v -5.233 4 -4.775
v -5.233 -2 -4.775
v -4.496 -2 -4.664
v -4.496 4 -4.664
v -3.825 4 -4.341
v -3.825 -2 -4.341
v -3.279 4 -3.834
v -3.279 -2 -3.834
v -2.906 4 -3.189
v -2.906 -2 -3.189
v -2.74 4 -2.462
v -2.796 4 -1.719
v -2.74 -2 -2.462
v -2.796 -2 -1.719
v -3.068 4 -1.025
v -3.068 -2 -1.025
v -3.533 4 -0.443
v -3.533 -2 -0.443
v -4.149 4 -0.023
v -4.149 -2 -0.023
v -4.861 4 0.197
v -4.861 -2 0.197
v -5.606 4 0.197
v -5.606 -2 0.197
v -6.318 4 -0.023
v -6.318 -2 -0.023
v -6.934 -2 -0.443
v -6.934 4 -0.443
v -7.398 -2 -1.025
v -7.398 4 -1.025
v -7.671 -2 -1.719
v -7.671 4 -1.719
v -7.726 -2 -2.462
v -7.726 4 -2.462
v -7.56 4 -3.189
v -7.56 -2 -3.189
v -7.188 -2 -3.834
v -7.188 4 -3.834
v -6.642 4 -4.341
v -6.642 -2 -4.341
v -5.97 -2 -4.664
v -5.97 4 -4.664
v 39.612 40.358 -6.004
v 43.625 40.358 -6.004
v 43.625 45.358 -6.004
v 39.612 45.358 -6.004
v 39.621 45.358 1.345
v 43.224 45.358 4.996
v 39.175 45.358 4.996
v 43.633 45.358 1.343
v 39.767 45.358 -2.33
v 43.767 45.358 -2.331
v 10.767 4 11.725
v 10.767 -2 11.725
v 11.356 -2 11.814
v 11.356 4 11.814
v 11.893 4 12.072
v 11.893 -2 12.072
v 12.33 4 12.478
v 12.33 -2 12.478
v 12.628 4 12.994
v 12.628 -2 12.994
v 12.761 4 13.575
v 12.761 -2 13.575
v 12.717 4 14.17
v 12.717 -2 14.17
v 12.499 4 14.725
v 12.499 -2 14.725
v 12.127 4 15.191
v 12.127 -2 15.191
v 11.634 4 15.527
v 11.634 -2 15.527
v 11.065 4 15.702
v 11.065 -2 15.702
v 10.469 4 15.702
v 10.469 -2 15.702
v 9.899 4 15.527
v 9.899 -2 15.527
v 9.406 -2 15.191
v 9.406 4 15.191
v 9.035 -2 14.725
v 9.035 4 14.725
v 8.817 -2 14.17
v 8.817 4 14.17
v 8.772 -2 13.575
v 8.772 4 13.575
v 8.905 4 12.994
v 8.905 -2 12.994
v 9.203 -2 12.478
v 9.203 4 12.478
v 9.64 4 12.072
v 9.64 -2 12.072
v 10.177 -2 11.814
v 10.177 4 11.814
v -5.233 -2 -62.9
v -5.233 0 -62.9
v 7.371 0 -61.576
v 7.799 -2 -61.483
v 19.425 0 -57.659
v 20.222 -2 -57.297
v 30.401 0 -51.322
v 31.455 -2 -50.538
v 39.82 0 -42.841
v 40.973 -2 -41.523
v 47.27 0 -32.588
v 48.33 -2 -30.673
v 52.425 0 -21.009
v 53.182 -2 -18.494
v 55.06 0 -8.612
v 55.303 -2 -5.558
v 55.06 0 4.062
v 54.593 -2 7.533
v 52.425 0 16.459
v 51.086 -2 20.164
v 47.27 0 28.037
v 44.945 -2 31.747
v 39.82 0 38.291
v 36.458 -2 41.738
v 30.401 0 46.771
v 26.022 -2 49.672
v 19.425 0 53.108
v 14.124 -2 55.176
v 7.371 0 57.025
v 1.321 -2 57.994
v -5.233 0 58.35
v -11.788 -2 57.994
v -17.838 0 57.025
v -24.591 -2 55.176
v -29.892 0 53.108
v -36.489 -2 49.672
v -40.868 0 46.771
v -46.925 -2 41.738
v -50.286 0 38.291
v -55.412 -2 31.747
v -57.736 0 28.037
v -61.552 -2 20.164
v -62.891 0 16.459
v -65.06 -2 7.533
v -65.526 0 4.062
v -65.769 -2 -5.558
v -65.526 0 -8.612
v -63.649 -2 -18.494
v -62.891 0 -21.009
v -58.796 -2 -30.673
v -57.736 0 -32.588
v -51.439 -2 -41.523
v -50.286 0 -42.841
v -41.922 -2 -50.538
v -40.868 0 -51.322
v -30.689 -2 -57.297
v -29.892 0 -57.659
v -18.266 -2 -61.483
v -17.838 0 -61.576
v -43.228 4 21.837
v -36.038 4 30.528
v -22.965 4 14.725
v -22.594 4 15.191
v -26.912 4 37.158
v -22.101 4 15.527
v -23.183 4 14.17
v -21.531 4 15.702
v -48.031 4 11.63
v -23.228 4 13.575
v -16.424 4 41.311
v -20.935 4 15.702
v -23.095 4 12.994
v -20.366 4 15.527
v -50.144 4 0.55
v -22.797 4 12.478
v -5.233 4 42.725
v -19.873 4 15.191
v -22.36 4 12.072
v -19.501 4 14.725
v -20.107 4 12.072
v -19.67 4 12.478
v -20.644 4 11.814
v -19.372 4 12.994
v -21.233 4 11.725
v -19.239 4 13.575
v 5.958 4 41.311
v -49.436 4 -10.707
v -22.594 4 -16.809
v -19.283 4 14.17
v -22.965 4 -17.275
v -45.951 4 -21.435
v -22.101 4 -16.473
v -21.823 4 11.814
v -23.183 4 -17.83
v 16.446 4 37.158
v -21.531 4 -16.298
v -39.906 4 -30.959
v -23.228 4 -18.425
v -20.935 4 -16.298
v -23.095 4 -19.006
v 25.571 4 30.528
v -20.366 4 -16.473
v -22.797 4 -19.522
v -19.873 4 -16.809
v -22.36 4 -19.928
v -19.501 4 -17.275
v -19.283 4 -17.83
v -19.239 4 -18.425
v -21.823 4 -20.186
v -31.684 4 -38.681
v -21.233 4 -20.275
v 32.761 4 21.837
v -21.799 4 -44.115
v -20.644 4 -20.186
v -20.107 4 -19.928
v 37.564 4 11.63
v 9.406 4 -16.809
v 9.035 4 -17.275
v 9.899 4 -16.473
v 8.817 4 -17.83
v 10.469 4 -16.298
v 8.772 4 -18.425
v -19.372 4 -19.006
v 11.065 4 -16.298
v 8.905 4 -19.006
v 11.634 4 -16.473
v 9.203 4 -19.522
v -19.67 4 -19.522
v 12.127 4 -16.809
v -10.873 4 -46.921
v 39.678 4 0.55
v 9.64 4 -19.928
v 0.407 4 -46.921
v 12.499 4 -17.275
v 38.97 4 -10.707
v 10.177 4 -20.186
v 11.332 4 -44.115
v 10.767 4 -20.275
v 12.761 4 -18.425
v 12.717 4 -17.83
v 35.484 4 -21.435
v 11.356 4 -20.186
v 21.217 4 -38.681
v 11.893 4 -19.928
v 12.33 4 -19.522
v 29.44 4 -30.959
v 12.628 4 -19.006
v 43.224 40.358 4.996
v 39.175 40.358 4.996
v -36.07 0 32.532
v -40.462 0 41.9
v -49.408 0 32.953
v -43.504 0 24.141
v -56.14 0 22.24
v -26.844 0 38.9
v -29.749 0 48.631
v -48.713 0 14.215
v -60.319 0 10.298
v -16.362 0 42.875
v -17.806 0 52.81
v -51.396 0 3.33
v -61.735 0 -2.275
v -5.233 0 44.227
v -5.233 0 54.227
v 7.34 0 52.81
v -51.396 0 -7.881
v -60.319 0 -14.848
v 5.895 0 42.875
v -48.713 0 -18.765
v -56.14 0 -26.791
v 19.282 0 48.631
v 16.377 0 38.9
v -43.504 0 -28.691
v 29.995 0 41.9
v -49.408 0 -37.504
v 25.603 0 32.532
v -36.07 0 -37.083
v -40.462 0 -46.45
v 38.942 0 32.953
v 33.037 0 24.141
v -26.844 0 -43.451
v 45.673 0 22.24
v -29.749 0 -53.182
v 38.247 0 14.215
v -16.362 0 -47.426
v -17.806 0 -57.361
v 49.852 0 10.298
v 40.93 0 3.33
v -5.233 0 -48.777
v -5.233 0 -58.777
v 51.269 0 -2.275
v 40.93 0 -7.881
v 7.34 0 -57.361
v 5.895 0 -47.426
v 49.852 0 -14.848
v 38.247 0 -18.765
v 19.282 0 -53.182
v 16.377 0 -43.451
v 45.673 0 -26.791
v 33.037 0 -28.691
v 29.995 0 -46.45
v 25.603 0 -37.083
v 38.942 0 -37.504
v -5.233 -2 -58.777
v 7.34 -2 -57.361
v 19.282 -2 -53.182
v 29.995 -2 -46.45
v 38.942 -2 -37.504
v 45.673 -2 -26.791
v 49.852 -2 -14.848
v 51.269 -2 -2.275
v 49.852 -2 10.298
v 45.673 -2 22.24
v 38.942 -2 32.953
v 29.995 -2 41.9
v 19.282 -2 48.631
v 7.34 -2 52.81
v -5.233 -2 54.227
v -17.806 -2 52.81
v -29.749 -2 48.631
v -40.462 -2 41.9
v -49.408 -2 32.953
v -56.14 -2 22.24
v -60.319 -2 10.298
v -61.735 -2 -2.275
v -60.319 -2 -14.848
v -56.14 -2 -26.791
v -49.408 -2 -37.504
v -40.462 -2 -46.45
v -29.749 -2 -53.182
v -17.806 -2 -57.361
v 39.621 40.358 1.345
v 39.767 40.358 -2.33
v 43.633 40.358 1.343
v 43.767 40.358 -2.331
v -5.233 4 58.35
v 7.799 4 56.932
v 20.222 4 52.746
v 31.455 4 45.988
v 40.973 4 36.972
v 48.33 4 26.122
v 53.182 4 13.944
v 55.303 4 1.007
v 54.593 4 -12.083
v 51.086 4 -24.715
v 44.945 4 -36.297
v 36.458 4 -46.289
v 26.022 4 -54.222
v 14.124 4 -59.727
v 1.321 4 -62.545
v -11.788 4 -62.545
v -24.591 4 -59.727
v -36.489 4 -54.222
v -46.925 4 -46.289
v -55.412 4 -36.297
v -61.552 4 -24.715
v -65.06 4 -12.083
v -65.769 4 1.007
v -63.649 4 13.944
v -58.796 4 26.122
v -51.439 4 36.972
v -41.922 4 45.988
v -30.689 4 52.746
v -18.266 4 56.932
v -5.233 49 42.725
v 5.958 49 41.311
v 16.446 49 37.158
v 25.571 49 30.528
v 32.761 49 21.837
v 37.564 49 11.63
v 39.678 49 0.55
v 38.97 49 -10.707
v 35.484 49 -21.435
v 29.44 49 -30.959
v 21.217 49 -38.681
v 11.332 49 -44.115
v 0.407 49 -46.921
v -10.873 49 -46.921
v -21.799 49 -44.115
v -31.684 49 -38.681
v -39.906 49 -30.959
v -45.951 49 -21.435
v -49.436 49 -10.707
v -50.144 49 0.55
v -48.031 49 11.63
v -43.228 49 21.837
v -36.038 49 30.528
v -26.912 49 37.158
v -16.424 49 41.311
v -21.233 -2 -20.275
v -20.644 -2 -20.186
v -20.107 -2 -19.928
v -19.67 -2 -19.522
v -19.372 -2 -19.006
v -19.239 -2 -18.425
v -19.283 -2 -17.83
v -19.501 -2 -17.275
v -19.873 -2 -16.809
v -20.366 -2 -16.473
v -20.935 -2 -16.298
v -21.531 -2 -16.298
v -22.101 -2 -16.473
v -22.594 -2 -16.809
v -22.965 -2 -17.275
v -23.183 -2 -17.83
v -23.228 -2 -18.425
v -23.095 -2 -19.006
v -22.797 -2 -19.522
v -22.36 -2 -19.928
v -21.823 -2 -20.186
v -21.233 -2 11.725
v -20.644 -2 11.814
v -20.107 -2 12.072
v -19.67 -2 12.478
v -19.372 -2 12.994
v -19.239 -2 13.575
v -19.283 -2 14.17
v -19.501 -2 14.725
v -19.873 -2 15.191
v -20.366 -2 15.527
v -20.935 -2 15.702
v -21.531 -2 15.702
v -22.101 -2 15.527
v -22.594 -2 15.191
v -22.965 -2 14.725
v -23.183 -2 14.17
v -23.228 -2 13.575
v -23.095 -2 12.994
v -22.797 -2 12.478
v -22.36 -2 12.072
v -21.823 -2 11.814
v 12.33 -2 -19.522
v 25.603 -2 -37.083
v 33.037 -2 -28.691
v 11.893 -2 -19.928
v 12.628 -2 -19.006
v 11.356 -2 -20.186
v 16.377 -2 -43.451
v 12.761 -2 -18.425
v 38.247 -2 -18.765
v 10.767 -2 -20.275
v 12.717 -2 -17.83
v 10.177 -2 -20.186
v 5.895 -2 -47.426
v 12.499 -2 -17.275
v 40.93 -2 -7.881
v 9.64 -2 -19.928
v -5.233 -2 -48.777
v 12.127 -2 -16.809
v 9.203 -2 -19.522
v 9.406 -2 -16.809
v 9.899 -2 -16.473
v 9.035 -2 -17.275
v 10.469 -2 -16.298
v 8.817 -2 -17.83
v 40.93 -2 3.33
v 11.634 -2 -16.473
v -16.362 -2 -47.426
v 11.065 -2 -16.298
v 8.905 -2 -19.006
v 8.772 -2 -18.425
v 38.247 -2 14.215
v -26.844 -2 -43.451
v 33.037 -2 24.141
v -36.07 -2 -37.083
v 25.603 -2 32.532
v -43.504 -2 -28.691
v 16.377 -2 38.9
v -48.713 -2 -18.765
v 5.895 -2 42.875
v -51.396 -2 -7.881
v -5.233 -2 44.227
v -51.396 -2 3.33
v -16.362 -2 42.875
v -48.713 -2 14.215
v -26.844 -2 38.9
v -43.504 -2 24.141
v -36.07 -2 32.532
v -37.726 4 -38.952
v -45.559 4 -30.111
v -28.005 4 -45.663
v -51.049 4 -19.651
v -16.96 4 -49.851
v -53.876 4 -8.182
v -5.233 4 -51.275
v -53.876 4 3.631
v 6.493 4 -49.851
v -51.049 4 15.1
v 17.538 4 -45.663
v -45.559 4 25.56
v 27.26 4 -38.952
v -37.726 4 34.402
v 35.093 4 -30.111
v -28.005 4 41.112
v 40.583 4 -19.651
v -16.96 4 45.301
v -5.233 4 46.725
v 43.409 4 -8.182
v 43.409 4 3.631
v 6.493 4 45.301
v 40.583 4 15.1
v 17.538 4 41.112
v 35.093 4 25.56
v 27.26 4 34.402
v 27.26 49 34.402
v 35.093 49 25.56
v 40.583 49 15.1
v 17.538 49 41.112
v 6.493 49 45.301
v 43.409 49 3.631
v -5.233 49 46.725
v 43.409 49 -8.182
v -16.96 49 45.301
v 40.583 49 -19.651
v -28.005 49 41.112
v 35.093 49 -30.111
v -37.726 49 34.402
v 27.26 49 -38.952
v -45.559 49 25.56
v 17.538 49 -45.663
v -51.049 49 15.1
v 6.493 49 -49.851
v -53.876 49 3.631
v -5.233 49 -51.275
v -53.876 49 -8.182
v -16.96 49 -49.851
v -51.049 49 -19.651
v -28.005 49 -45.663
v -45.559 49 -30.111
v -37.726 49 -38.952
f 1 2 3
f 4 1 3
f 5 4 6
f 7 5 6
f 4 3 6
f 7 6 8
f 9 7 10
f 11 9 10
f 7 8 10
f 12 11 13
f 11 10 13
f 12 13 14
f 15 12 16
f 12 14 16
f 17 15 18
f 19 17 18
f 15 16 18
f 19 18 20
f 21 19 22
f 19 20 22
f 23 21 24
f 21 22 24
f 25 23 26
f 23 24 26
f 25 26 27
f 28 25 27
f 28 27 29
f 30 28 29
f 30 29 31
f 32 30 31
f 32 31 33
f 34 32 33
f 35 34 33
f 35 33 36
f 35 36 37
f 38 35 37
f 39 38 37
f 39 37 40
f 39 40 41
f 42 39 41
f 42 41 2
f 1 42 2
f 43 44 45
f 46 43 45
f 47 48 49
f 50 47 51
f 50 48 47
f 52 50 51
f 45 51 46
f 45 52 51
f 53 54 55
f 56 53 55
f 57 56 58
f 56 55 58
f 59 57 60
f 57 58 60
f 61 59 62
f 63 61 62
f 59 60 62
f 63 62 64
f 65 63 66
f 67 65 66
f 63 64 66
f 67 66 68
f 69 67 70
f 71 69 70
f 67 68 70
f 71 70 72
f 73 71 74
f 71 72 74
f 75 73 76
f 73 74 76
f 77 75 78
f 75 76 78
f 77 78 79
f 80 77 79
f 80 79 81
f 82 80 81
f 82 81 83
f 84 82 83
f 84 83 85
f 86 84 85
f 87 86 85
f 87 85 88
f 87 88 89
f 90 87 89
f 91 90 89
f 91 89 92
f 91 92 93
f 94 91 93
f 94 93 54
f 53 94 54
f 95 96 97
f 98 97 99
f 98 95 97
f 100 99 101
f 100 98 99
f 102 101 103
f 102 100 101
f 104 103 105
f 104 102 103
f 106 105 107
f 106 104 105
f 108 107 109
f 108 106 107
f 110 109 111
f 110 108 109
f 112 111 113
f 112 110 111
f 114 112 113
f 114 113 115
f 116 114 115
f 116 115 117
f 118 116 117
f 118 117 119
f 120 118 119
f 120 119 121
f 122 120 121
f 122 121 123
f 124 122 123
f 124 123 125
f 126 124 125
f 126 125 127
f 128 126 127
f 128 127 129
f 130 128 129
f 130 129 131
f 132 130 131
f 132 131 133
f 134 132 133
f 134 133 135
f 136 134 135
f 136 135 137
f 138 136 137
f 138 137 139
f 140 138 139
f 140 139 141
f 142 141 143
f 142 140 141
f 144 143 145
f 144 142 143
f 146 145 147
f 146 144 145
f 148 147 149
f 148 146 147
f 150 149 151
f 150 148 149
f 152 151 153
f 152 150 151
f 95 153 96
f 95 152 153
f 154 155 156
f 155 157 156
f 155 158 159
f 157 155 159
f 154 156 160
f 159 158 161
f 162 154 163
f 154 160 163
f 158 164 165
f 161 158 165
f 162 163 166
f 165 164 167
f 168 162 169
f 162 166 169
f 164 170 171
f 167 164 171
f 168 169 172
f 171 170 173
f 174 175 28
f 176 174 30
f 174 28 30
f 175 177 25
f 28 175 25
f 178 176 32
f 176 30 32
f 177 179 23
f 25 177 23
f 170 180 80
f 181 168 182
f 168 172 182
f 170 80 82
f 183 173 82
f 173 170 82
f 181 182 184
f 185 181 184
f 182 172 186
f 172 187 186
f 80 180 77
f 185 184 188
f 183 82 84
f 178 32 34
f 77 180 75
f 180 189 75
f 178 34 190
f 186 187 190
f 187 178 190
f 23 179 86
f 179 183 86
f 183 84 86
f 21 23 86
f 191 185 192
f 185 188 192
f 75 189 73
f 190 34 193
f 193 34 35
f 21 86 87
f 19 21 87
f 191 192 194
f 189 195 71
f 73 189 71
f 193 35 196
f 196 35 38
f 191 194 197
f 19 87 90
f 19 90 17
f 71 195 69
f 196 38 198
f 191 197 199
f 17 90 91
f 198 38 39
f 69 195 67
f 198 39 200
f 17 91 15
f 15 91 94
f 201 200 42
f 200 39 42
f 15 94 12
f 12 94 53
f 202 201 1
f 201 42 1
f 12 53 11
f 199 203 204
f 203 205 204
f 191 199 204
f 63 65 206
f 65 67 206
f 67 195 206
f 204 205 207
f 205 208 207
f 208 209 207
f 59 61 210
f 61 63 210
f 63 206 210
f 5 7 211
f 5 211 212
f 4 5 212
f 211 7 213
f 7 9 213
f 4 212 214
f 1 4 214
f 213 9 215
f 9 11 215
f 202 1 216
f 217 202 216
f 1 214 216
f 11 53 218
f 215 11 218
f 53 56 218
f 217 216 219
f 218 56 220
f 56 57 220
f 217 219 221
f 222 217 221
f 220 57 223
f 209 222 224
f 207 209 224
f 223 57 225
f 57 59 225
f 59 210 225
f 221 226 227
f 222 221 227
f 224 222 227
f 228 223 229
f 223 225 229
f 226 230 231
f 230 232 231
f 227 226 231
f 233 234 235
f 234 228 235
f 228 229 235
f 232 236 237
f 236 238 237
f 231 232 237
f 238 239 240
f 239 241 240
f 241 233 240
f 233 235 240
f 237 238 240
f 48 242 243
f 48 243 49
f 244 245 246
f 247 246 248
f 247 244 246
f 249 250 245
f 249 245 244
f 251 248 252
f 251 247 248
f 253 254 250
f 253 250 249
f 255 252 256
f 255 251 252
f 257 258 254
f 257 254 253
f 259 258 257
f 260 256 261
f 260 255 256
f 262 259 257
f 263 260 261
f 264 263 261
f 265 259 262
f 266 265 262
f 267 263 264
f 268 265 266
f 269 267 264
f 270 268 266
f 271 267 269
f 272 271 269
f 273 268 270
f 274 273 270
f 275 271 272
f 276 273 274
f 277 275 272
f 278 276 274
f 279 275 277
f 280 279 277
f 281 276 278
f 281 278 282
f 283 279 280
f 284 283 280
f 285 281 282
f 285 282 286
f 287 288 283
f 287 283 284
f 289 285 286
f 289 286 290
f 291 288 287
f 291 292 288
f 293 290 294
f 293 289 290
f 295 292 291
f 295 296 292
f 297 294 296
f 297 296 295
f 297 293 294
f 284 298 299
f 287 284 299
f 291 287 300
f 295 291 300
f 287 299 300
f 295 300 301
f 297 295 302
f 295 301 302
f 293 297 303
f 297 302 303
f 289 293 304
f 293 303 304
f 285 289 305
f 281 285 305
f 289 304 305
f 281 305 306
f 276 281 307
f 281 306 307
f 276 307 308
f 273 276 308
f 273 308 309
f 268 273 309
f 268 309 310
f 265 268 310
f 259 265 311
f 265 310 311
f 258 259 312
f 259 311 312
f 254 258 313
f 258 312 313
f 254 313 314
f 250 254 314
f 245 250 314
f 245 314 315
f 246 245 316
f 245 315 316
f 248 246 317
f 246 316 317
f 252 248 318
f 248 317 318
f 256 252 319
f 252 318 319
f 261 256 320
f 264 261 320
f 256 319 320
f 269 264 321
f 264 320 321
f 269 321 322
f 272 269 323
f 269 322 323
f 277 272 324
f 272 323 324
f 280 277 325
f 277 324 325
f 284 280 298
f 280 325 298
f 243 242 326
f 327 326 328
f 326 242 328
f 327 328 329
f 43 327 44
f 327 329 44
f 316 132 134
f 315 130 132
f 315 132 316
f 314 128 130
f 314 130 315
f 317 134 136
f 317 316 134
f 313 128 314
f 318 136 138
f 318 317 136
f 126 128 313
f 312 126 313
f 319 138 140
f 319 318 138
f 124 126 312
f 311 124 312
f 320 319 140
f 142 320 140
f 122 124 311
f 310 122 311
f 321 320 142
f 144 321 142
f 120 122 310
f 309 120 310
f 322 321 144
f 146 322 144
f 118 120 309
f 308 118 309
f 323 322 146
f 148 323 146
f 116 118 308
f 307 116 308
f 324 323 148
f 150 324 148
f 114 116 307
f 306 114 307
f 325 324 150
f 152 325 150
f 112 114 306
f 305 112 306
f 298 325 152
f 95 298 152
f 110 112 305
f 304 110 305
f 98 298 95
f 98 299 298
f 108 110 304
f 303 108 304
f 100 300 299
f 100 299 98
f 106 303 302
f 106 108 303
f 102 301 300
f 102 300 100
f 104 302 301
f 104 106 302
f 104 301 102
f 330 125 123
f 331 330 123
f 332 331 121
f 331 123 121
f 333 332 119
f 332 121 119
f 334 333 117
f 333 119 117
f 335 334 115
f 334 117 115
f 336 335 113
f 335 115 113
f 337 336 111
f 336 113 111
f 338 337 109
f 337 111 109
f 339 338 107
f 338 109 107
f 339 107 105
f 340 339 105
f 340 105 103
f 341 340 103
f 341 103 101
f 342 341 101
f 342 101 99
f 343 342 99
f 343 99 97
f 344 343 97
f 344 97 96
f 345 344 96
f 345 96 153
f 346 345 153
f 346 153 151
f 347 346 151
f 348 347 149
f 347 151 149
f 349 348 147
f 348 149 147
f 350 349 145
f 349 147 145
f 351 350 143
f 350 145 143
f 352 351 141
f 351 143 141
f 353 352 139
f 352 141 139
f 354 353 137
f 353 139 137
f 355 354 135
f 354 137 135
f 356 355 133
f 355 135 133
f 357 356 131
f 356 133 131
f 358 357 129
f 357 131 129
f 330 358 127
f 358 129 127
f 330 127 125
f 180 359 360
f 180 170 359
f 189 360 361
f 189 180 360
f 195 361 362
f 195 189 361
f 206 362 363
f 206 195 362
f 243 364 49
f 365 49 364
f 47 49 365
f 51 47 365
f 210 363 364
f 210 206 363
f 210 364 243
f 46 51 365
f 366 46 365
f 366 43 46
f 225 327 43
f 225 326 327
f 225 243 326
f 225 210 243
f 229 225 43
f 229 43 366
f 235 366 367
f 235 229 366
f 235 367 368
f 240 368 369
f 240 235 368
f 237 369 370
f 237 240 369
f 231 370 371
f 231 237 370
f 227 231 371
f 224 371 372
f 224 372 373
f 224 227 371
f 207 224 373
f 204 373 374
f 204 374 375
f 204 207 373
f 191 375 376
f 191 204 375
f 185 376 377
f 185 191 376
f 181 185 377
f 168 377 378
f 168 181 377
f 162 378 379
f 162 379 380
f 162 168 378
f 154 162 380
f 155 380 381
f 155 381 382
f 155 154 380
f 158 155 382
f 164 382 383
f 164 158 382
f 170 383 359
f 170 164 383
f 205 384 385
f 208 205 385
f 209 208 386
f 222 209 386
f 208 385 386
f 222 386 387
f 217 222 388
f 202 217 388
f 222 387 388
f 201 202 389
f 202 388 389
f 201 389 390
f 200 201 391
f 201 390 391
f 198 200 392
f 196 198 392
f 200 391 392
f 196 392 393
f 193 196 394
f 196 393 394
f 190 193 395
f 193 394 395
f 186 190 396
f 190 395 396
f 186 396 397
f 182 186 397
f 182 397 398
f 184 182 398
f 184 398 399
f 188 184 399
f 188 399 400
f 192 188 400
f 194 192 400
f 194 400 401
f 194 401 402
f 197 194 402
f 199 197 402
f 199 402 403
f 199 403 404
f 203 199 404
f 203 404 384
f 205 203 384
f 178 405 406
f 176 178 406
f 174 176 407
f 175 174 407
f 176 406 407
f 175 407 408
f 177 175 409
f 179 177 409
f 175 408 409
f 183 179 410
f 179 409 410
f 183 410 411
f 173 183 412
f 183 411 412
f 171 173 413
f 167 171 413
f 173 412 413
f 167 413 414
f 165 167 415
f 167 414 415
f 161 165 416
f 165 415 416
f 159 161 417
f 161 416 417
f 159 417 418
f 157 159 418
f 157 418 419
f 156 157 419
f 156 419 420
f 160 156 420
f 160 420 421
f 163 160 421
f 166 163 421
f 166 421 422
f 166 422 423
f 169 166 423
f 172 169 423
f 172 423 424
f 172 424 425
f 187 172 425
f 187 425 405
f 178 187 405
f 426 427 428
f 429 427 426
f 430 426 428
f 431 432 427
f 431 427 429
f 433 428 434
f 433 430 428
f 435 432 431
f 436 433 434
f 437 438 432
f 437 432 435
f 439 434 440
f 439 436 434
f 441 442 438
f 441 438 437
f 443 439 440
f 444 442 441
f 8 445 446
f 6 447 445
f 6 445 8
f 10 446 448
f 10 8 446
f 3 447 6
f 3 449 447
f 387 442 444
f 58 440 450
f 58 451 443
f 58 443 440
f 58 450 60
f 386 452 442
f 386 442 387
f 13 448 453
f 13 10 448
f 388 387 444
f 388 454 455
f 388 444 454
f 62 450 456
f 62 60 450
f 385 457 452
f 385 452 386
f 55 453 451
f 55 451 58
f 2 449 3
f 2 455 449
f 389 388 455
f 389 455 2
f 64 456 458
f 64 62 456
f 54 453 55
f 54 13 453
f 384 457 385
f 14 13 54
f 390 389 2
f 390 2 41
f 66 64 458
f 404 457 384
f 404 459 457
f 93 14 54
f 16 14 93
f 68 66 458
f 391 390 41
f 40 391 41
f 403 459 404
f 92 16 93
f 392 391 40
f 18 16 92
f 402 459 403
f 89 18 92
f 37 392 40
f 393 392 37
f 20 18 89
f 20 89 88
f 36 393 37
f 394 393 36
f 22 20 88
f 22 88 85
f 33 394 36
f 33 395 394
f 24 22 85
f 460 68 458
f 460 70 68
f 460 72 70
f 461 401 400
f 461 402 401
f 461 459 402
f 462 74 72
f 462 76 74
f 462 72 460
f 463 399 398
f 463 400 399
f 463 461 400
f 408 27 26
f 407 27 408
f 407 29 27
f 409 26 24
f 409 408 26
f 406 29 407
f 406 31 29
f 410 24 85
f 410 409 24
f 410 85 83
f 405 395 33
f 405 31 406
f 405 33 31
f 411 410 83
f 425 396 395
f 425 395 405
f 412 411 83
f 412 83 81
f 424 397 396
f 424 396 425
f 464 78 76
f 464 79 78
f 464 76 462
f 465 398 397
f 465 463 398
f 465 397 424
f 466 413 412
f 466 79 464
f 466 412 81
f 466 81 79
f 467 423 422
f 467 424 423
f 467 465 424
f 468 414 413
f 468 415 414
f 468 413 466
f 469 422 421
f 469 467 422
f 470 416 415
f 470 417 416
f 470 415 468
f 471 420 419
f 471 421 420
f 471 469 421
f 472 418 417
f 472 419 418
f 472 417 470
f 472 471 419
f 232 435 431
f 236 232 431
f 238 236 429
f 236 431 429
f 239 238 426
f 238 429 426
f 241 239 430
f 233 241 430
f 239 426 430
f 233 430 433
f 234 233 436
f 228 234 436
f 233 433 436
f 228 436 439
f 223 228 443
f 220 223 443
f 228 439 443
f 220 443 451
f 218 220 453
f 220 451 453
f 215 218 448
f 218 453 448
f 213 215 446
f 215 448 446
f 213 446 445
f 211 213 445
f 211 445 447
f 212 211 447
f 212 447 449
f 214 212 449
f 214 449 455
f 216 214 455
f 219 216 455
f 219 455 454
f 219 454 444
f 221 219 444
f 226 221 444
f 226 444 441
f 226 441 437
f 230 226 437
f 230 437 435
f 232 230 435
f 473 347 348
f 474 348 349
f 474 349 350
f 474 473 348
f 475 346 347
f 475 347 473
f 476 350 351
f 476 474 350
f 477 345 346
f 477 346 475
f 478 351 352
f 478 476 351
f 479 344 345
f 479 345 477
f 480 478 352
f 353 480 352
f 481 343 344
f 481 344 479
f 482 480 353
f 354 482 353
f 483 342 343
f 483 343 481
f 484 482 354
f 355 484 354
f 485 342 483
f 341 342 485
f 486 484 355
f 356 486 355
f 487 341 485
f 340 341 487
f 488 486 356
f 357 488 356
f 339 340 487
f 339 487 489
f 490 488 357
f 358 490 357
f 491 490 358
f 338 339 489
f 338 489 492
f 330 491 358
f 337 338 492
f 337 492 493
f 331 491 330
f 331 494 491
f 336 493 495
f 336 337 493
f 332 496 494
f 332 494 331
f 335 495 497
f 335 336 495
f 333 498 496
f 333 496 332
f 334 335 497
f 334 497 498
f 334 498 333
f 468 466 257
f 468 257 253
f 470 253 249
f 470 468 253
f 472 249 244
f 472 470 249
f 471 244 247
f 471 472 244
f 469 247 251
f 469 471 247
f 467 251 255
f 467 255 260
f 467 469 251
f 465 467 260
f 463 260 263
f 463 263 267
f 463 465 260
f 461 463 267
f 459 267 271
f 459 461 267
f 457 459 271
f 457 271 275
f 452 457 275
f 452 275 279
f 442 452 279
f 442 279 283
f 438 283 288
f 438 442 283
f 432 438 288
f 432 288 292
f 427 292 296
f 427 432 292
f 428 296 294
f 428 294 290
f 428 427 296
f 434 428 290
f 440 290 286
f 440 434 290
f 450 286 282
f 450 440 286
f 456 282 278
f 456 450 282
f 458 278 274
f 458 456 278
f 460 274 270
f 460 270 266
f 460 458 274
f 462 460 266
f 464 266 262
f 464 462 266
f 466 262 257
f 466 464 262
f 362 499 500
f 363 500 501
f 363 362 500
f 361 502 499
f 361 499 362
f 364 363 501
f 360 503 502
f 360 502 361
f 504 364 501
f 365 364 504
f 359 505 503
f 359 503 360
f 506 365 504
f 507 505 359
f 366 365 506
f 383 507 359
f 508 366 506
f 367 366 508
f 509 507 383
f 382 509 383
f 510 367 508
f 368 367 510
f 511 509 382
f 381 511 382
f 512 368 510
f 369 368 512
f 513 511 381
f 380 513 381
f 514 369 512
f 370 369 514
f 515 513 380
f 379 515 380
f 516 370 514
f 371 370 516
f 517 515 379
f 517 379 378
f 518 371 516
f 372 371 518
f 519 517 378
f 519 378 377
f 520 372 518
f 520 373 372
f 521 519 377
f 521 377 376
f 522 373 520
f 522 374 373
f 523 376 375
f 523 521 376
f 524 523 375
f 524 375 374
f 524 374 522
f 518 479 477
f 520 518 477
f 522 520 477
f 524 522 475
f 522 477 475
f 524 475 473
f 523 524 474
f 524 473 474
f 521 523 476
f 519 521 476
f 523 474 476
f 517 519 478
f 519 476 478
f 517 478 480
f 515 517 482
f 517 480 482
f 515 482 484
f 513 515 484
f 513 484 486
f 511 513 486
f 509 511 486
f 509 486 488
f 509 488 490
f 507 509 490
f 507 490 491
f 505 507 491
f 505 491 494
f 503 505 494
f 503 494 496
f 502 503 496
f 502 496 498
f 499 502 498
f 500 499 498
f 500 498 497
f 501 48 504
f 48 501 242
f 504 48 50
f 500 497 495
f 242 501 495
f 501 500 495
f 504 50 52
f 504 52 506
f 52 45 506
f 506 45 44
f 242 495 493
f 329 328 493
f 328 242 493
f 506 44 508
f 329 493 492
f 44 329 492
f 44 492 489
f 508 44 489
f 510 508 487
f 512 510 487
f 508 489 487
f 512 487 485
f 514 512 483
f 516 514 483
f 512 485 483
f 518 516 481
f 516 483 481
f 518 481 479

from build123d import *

# Parameters (mm, degrees)
SKETCH1_R           = 60.625
SKETCH1_R_2         = 45
BOSS_EXTRUDE1_DEPTH = 4
SKETCH2_R           = 49
SKETCH2_R_2         = 45
BOSS_EXTRUDE2_DEPTH = 45
SKETCH3_R           = 45
BOSS_EXTRUDE3_DEPTH = 4
BOSS_EXTRUDE7_START = 2
SKETCH4_R           = 60.625
SKETCH4_R_2         = 56.502019499
SKETCH4_R_3         = 46.502019499
BOSS_EXTRUDE7_DEPTH = 2
SKETCH5_R           = 2.5
SKETCH5_R_2         = 2
CUT_EXTRUDE1_DEPTH  = 10
SKETCH6_W           = 11
SKETCH6_H           = 5
CUT_EXTRUDE2_DEPTH  = 10


with BuildPart() as part:
    # Sketch1 → Boss-Extrude1 (new body)
    with BuildSketch(Plane(origin=(0, 0, 0), x_dir=(1, 0, 0), z_dir=(0, 1, 0))):
        with Locations(Location((-5.233283161, 2.275340505, 0), (0, 0, 270))):
            Circle(SKETCH1_R)
        with Locations(Location((-5.233283161, 2.275340505, 0), (0, 0, 270))):
            Circle(SKETCH1_R_2, mode=Mode.SUBTRACT)
    extrude(amount=BOSS_EXTRUDE1_DEPTH)

    # Sketch2 → Boss-Extrude2 (add)
    with BuildSketch(Plane(origin=(0, 4, 0), x_dir=(1, 0, 0), z_dir=(0, 1, 0))):
        with Locations(Location((-5.233283161, 2.275340505, 0), (0, 0, 90))):
            Circle(SKETCH2_R)
        with Locations(Location((-5.233283161, 2.275340505, 0), (0, 0, 270))):
            Circle(SKETCH2_R_2, mode=Mode.SUBTRACT)
    extrude(amount=BOSS_EXTRUDE2_DEPTH)

    # Sketch3 → Boss-Extrude3 (add)
    with BuildSketch(Plane(origin=(0, 0, 0), x_dir=(-1, 0, 0), z_dir=(0, -1, 0))):
        with Locations(Location((5.233283161, 2.275340505, 0), (0, 0, 90))):
            Circle(SKETCH3_R)
    extrude(amount=-BOSS_EXTRUDE3_DEPTH)

    # Sketch4 → Boss-Extrude7 (add)
    # profile 1 of 2: a face of its own
    with BuildSketch(Plane.XZ.offset(BOSS_EXTRUDE7_START)):
        with Locations(Location((-5.233283161, -2.275340505, 0), (0, 0, 270))):
            Circle(SKETCH4_R)
        with Locations(Location((-5.233283161, -2.275340505, 0), (0, 0, 270))):
            Circle(SKETCH4_R_2, mode=Mode.SUBTRACT)
    # profile 2 of 2: a face of its own
    with BuildSketch(Plane.XZ.offset(BOSS_EXTRUDE7_START)):
        with Locations(Location((-5.233283161, -2.275340505, 0), (0, 0, 90))):
            Circle(SKETCH4_R_3)
    extrude(amount=-BOSS_EXTRUDE7_DEPTH)

    # Sketch5 → Cut-Extrude1 (cut)
    with BuildSketch(Plane(origin=(0, -2, 0), x_dir=(-1, 0, 0), z_dir=(0, -1, 0))):
        with Locations(Location((5.233283161, 2.275340505, 0), (0, 0, 90))):
            Circle(SKETCH5_R)
        with Locations(Location((-10.766716839, -13.724659495, 0), (0, 0, 90))):
            Circle(SKETCH5_R_2)
        with Locations(Location((21.233283161, -13.724659495, 0), (0, 0, 90))):
            Circle(SKETCH5_R_2)
        with Locations(Location((21.233283161, 18.275340505, 0), (0, 0, 90))):
            Circle(SKETCH5_R_2)
        with Locations(Location((-10.766716839, 18.275340505, 0), (0, 0, 90))):
            Circle(SKETCH5_R_2)
    extrude(amount=-CUT_EXTRUDE1_DEPTH, mode=Mode.SUBTRACT)

    # Sketch6 → Cut-Extrude2 (cut)
    with BuildSketch(Plane(origin=(43.766716839, 0, 0), x_dir=(0, 0, -1), z_dir=(1, 0, 0))):
        with Locations((0.504292548, 42.858395169)):
            Rectangle(SKETCH6_W, SKETCH6_H)
    extrude(amount=-CUT_EXTRUDE2_DEPTH, mode=Mode.SUBTRACT)


solid = part.part
